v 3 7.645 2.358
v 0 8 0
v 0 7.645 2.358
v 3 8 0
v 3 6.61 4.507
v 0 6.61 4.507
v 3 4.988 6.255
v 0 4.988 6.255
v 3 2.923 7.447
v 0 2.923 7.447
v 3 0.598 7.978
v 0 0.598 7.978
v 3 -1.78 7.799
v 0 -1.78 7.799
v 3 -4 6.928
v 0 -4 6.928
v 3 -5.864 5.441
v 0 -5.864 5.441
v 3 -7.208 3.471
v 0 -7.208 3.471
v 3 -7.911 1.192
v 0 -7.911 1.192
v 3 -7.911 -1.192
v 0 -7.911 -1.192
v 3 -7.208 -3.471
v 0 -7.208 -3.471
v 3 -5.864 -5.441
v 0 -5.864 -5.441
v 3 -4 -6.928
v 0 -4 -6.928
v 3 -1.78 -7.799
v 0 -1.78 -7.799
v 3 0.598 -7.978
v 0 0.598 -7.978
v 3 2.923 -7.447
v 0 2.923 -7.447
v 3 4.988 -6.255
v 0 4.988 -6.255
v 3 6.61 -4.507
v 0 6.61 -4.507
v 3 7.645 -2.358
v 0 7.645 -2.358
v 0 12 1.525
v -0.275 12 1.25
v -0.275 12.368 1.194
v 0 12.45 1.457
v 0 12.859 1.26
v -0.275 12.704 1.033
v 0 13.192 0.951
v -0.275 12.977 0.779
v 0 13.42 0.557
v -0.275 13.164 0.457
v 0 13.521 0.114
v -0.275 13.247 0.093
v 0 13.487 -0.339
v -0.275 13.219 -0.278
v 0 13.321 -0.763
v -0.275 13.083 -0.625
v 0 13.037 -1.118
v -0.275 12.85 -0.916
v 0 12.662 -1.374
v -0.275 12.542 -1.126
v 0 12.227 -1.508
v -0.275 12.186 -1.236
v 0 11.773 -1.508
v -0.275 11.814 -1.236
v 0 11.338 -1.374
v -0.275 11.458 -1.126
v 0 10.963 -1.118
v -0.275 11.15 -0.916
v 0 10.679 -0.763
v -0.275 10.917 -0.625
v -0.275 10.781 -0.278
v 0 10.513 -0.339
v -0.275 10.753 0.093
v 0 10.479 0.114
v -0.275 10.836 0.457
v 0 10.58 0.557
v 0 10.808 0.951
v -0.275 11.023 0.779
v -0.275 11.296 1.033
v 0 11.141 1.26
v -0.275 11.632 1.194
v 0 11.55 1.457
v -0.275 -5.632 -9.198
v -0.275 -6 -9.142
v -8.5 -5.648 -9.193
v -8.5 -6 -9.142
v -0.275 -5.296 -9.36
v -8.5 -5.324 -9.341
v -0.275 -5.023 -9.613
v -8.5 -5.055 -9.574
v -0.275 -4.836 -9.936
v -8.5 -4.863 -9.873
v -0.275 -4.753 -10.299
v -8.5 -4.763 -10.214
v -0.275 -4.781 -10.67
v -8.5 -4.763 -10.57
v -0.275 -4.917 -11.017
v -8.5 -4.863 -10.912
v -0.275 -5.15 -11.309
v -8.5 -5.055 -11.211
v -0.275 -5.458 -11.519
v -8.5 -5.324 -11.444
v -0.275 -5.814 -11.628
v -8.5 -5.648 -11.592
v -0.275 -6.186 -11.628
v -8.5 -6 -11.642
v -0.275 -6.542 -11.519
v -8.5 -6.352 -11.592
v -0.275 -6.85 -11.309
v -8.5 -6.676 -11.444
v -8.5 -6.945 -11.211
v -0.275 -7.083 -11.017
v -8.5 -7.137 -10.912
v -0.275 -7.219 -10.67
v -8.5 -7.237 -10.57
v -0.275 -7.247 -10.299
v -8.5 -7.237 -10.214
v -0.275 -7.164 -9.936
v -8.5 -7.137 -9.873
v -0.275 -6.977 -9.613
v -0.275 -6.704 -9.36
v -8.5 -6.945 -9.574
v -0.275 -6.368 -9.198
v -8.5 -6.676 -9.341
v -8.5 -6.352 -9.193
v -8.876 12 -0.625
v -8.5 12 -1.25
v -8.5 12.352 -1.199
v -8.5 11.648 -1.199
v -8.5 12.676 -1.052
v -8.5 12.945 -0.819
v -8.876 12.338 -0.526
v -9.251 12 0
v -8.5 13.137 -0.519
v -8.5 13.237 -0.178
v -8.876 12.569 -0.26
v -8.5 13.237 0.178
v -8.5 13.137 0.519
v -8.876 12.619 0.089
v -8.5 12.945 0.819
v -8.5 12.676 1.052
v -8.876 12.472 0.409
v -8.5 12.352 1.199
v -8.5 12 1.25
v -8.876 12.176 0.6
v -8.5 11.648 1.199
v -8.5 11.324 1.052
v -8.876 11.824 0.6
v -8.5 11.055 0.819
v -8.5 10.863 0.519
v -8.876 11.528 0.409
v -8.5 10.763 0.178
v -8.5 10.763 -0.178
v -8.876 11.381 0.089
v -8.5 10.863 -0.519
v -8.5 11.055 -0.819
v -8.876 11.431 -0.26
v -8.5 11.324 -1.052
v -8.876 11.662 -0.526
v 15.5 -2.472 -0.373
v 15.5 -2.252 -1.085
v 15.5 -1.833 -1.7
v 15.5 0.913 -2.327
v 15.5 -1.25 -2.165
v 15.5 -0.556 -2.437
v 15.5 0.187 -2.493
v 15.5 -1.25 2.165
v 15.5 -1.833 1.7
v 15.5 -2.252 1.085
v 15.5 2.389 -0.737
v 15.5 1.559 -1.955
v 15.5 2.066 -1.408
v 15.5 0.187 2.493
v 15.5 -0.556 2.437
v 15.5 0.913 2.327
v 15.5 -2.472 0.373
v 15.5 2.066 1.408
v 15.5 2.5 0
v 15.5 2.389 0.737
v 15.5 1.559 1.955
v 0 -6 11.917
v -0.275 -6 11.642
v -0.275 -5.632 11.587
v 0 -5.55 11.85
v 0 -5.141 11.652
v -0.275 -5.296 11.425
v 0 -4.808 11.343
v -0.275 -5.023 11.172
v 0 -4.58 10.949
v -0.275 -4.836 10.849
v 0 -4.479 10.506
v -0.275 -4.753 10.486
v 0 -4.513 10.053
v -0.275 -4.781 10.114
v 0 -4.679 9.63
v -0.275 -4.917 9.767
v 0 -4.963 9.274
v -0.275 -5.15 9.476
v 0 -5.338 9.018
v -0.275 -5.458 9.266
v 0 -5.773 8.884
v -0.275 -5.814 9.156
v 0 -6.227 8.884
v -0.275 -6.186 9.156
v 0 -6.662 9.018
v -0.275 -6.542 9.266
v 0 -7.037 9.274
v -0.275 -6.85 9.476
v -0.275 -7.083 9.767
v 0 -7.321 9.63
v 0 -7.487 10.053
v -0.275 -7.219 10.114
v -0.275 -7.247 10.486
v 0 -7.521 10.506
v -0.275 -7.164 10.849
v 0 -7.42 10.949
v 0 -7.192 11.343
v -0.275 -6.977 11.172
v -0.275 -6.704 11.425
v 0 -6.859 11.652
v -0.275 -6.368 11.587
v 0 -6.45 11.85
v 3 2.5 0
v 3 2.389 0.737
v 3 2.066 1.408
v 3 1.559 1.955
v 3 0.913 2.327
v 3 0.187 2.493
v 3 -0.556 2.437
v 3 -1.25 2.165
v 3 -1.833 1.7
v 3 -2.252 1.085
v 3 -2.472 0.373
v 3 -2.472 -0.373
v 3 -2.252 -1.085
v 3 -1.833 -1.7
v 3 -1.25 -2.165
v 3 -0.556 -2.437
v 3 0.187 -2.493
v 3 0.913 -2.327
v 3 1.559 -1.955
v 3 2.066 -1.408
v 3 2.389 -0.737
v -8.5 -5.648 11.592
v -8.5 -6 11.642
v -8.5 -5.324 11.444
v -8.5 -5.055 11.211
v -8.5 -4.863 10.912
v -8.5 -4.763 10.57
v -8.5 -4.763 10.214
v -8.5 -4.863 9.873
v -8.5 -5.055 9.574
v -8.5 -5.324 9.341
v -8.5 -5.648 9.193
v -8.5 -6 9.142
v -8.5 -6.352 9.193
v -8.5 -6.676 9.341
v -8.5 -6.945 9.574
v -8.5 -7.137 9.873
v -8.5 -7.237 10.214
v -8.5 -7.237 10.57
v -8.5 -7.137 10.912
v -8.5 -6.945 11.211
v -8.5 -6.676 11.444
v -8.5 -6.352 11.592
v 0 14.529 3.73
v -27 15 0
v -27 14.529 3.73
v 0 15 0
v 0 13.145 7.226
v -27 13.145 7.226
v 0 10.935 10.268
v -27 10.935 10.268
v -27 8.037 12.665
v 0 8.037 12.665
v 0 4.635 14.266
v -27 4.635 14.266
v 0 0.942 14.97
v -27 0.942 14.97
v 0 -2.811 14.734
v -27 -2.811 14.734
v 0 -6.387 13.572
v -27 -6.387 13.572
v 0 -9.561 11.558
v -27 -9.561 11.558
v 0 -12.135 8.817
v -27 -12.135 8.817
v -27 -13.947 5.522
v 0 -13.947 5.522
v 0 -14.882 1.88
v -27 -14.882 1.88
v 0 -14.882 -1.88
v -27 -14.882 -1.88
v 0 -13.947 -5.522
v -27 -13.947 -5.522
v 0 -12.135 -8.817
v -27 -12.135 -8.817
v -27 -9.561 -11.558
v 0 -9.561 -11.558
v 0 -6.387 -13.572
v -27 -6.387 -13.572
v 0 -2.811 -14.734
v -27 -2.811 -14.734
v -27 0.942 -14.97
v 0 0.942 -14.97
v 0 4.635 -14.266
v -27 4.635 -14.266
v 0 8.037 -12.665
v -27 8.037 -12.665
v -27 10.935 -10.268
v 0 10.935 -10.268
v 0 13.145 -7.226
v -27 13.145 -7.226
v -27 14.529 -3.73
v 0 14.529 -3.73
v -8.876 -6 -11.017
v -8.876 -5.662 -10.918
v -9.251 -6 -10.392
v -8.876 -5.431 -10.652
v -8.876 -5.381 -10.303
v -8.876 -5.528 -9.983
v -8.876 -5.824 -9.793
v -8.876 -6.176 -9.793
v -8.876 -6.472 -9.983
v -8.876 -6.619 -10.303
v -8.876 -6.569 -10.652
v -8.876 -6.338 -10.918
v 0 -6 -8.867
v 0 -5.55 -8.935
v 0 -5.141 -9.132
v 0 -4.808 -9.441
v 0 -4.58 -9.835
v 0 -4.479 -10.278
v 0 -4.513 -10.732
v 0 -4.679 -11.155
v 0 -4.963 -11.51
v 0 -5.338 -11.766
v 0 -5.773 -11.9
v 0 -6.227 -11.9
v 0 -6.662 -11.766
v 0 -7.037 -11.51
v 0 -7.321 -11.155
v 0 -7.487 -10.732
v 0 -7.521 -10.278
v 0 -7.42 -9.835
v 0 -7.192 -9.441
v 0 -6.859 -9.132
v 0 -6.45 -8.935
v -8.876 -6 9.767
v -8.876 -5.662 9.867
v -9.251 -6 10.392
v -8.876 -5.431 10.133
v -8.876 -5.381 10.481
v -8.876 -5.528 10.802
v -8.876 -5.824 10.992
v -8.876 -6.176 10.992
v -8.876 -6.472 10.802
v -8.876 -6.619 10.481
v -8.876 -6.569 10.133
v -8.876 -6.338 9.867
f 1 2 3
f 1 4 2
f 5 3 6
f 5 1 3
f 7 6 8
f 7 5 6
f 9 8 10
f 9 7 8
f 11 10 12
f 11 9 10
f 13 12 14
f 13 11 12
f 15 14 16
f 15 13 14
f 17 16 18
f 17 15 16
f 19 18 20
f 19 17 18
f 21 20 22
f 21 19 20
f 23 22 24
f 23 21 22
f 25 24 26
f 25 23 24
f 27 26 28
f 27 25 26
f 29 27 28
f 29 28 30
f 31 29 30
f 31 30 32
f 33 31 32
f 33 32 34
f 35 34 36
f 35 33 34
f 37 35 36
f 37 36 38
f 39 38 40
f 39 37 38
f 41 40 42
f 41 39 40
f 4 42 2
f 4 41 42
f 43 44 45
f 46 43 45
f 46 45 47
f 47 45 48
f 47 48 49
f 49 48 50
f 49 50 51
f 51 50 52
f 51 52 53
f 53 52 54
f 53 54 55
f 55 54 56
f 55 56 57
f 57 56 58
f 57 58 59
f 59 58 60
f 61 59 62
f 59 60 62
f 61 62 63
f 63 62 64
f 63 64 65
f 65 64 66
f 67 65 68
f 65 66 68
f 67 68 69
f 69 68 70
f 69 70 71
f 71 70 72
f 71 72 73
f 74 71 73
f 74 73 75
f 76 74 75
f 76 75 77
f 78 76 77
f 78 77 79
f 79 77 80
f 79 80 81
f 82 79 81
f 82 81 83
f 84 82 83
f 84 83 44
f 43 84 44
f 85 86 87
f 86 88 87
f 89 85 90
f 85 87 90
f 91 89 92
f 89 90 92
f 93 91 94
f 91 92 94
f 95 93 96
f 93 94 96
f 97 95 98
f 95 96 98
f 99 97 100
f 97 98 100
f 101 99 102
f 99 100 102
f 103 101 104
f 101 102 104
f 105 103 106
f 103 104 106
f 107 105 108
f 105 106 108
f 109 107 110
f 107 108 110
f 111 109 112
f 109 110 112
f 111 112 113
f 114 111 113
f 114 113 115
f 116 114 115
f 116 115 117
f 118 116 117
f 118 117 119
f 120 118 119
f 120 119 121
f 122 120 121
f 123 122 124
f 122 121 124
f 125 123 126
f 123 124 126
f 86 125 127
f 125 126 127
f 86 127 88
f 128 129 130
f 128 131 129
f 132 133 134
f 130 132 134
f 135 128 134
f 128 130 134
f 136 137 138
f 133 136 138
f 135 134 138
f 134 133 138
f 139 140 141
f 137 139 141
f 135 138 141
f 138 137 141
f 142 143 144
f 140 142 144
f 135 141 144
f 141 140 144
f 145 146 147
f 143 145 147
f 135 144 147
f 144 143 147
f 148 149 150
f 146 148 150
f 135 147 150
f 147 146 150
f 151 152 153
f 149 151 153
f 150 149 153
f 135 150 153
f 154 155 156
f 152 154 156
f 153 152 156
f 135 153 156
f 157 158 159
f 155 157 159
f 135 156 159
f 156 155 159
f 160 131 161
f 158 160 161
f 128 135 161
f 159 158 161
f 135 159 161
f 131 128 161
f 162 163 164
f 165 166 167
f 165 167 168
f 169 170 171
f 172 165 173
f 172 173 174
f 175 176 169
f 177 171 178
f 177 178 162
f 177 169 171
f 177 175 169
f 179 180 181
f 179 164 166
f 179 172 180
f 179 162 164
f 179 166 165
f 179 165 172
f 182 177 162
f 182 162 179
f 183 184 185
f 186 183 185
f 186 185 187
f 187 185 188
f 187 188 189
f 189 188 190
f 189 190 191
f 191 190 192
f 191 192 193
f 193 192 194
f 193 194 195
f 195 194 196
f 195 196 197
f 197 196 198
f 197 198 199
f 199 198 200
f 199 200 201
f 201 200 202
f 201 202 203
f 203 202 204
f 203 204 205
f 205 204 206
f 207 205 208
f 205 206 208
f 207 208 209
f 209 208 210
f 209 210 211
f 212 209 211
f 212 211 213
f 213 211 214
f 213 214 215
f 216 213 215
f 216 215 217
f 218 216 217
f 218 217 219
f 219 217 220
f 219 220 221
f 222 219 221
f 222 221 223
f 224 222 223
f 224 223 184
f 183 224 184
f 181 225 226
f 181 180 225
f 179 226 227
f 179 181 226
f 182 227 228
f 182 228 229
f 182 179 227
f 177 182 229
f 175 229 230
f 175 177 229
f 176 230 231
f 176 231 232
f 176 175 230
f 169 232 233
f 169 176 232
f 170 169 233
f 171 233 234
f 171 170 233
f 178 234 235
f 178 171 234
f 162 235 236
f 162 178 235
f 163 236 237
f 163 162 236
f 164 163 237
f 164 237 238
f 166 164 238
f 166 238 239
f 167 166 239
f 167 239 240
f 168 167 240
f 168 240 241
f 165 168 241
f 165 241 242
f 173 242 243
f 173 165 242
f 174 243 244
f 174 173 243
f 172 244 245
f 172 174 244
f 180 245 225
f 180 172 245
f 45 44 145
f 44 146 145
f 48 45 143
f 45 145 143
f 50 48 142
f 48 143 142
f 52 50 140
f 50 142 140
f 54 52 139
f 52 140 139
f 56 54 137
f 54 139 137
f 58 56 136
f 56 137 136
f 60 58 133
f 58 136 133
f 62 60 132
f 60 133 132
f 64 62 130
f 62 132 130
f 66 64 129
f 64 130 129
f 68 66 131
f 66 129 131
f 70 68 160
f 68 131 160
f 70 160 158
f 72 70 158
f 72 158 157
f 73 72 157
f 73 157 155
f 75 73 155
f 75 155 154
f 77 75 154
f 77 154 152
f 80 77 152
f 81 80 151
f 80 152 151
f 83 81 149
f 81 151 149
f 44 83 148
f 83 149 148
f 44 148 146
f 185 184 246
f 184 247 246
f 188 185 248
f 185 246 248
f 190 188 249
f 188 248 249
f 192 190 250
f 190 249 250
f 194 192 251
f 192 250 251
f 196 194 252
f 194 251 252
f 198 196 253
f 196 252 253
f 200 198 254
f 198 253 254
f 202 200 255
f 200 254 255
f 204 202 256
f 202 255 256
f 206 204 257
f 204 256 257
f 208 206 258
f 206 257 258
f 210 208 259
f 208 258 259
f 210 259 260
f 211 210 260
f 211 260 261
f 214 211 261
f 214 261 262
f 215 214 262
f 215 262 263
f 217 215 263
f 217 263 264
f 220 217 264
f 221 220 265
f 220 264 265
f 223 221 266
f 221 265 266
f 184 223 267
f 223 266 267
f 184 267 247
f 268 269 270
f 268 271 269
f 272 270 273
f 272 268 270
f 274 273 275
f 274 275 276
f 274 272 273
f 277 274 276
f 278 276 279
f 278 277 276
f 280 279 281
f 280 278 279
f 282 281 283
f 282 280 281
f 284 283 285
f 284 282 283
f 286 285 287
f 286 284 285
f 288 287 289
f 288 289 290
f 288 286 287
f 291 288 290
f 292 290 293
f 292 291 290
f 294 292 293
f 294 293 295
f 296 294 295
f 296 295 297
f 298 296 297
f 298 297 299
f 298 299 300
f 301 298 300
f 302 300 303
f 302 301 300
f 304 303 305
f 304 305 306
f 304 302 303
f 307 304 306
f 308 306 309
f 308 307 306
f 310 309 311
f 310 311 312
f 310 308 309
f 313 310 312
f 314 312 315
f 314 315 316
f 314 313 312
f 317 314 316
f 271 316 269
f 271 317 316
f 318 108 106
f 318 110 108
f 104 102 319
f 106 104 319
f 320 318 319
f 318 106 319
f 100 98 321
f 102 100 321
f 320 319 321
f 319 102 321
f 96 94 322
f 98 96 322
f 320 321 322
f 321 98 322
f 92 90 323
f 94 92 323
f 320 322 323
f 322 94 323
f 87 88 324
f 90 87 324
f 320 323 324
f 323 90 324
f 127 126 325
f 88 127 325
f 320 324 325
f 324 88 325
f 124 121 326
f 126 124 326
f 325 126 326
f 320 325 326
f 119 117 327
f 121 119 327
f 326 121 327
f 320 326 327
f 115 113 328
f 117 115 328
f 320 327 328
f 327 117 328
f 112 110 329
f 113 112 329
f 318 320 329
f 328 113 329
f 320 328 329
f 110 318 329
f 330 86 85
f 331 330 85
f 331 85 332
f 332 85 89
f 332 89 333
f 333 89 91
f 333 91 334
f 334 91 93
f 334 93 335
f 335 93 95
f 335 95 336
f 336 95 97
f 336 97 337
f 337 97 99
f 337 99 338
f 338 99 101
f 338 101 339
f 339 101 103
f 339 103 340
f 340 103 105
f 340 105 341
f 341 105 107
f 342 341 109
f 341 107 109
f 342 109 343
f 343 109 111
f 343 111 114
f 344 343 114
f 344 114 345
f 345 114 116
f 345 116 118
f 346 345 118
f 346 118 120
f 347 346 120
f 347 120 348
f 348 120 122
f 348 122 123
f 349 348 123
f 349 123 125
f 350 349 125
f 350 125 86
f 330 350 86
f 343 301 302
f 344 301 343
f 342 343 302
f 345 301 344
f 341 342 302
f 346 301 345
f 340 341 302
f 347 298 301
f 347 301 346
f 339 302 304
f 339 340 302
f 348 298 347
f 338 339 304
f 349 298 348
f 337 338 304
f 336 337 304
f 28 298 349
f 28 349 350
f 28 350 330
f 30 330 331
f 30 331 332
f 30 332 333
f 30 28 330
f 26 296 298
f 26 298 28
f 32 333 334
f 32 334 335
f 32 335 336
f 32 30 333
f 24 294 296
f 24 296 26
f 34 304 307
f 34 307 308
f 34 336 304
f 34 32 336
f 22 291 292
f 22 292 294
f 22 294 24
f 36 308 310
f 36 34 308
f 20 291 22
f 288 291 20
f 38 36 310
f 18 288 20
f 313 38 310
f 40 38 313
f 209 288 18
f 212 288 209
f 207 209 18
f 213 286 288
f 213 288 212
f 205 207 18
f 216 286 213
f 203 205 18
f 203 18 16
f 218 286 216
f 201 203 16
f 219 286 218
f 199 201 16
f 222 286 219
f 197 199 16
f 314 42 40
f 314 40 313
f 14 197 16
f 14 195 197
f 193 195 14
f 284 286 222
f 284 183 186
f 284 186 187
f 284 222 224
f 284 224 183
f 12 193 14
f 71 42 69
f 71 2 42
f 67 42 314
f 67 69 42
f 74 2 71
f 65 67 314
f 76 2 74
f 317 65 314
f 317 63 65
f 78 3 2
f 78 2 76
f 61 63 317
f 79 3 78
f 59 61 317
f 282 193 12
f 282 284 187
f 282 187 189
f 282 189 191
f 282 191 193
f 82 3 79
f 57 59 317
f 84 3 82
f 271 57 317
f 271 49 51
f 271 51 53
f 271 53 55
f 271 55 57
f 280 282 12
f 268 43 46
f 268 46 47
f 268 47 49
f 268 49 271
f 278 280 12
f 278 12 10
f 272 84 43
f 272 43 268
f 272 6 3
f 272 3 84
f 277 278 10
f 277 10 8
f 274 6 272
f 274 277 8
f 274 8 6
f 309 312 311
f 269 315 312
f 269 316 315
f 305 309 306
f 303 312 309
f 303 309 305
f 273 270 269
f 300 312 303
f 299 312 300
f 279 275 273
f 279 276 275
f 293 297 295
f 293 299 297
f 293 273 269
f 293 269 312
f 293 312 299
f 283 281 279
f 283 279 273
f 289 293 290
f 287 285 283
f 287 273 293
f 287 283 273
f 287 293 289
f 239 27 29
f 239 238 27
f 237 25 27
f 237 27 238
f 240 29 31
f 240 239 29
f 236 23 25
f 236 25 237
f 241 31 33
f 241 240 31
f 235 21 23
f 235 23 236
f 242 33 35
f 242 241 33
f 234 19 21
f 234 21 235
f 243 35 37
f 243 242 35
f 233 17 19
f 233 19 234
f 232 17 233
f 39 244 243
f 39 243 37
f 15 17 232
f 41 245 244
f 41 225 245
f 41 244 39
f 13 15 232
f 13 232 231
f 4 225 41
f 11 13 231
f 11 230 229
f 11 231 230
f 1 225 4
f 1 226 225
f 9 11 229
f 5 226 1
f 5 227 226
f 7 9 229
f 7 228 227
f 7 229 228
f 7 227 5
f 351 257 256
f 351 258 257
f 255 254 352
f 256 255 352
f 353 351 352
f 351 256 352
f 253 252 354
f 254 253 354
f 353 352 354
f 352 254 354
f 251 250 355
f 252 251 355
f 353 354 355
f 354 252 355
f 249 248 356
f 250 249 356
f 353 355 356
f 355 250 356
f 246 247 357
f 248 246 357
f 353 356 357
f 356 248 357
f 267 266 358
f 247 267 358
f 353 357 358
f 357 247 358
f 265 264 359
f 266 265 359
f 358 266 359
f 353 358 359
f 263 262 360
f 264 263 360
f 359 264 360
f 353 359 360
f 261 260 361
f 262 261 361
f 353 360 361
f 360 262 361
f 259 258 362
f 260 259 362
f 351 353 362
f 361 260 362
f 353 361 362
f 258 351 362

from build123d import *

# Parameters (mm, degrees)
TROU_TARAUD_M3X0_51_D           = 2.5
TROU_TARAUD_M3X0_51_DEPTH       = 8.5
TROU_TARAUD_M3X0_51_CSINK_D     = 3.05
TROU_TARAUD_M3X0_51_CSINK_ANGLE = 90
TROU_TARAUD_M3X0_51_TIP         = 0.751075774


with BuildPart() as part:
    # Esquisse1 → Révolution1 (revolve)
    with BuildSketch(Plane.XY):
        Polygon((15.5, 2.5), (15.5, 0), (-27, 0), (-27, 15), (0, 15), (0, 8), (3, 8), (3, 2.5), align=None)
    revolve(axis=Axis((-51.155053474, 0, 0), (1, 0, 0)))

    # Trou taraudé M3x0.51
    with Locations(Plane(origin=(0, 0, 0), x_dir=(0, 0, -1), z_dir=(1, 0, 0))):
        with Locations((0, 12), (-10.392304845, -6), (10.392304845, -6)):
            CounterSinkHole(TROU_TARAUD_M3X0_51_D / 2, TROU_TARAUD_M3X0_51_CSINK_D / 2, depth=TROU_TARAUD_M3X0_51_DEPTH, counter_sink_angle=TROU_TARAUD_M3X0_51_CSINK_ANGLE)
            with Locations((0, 0, -(TROU_TARAUD_M3X0_51_DEPTH + TROU_TARAUD_M3X0_51_TIP / 2))):  # 118° drill point
                Cone(0, TROU_TARAUD_M3X0_51_D / 2, TROU_TARAUD_M3X0_51_TIP, mode=Mode.SUBTRACT)


solid = part.part
